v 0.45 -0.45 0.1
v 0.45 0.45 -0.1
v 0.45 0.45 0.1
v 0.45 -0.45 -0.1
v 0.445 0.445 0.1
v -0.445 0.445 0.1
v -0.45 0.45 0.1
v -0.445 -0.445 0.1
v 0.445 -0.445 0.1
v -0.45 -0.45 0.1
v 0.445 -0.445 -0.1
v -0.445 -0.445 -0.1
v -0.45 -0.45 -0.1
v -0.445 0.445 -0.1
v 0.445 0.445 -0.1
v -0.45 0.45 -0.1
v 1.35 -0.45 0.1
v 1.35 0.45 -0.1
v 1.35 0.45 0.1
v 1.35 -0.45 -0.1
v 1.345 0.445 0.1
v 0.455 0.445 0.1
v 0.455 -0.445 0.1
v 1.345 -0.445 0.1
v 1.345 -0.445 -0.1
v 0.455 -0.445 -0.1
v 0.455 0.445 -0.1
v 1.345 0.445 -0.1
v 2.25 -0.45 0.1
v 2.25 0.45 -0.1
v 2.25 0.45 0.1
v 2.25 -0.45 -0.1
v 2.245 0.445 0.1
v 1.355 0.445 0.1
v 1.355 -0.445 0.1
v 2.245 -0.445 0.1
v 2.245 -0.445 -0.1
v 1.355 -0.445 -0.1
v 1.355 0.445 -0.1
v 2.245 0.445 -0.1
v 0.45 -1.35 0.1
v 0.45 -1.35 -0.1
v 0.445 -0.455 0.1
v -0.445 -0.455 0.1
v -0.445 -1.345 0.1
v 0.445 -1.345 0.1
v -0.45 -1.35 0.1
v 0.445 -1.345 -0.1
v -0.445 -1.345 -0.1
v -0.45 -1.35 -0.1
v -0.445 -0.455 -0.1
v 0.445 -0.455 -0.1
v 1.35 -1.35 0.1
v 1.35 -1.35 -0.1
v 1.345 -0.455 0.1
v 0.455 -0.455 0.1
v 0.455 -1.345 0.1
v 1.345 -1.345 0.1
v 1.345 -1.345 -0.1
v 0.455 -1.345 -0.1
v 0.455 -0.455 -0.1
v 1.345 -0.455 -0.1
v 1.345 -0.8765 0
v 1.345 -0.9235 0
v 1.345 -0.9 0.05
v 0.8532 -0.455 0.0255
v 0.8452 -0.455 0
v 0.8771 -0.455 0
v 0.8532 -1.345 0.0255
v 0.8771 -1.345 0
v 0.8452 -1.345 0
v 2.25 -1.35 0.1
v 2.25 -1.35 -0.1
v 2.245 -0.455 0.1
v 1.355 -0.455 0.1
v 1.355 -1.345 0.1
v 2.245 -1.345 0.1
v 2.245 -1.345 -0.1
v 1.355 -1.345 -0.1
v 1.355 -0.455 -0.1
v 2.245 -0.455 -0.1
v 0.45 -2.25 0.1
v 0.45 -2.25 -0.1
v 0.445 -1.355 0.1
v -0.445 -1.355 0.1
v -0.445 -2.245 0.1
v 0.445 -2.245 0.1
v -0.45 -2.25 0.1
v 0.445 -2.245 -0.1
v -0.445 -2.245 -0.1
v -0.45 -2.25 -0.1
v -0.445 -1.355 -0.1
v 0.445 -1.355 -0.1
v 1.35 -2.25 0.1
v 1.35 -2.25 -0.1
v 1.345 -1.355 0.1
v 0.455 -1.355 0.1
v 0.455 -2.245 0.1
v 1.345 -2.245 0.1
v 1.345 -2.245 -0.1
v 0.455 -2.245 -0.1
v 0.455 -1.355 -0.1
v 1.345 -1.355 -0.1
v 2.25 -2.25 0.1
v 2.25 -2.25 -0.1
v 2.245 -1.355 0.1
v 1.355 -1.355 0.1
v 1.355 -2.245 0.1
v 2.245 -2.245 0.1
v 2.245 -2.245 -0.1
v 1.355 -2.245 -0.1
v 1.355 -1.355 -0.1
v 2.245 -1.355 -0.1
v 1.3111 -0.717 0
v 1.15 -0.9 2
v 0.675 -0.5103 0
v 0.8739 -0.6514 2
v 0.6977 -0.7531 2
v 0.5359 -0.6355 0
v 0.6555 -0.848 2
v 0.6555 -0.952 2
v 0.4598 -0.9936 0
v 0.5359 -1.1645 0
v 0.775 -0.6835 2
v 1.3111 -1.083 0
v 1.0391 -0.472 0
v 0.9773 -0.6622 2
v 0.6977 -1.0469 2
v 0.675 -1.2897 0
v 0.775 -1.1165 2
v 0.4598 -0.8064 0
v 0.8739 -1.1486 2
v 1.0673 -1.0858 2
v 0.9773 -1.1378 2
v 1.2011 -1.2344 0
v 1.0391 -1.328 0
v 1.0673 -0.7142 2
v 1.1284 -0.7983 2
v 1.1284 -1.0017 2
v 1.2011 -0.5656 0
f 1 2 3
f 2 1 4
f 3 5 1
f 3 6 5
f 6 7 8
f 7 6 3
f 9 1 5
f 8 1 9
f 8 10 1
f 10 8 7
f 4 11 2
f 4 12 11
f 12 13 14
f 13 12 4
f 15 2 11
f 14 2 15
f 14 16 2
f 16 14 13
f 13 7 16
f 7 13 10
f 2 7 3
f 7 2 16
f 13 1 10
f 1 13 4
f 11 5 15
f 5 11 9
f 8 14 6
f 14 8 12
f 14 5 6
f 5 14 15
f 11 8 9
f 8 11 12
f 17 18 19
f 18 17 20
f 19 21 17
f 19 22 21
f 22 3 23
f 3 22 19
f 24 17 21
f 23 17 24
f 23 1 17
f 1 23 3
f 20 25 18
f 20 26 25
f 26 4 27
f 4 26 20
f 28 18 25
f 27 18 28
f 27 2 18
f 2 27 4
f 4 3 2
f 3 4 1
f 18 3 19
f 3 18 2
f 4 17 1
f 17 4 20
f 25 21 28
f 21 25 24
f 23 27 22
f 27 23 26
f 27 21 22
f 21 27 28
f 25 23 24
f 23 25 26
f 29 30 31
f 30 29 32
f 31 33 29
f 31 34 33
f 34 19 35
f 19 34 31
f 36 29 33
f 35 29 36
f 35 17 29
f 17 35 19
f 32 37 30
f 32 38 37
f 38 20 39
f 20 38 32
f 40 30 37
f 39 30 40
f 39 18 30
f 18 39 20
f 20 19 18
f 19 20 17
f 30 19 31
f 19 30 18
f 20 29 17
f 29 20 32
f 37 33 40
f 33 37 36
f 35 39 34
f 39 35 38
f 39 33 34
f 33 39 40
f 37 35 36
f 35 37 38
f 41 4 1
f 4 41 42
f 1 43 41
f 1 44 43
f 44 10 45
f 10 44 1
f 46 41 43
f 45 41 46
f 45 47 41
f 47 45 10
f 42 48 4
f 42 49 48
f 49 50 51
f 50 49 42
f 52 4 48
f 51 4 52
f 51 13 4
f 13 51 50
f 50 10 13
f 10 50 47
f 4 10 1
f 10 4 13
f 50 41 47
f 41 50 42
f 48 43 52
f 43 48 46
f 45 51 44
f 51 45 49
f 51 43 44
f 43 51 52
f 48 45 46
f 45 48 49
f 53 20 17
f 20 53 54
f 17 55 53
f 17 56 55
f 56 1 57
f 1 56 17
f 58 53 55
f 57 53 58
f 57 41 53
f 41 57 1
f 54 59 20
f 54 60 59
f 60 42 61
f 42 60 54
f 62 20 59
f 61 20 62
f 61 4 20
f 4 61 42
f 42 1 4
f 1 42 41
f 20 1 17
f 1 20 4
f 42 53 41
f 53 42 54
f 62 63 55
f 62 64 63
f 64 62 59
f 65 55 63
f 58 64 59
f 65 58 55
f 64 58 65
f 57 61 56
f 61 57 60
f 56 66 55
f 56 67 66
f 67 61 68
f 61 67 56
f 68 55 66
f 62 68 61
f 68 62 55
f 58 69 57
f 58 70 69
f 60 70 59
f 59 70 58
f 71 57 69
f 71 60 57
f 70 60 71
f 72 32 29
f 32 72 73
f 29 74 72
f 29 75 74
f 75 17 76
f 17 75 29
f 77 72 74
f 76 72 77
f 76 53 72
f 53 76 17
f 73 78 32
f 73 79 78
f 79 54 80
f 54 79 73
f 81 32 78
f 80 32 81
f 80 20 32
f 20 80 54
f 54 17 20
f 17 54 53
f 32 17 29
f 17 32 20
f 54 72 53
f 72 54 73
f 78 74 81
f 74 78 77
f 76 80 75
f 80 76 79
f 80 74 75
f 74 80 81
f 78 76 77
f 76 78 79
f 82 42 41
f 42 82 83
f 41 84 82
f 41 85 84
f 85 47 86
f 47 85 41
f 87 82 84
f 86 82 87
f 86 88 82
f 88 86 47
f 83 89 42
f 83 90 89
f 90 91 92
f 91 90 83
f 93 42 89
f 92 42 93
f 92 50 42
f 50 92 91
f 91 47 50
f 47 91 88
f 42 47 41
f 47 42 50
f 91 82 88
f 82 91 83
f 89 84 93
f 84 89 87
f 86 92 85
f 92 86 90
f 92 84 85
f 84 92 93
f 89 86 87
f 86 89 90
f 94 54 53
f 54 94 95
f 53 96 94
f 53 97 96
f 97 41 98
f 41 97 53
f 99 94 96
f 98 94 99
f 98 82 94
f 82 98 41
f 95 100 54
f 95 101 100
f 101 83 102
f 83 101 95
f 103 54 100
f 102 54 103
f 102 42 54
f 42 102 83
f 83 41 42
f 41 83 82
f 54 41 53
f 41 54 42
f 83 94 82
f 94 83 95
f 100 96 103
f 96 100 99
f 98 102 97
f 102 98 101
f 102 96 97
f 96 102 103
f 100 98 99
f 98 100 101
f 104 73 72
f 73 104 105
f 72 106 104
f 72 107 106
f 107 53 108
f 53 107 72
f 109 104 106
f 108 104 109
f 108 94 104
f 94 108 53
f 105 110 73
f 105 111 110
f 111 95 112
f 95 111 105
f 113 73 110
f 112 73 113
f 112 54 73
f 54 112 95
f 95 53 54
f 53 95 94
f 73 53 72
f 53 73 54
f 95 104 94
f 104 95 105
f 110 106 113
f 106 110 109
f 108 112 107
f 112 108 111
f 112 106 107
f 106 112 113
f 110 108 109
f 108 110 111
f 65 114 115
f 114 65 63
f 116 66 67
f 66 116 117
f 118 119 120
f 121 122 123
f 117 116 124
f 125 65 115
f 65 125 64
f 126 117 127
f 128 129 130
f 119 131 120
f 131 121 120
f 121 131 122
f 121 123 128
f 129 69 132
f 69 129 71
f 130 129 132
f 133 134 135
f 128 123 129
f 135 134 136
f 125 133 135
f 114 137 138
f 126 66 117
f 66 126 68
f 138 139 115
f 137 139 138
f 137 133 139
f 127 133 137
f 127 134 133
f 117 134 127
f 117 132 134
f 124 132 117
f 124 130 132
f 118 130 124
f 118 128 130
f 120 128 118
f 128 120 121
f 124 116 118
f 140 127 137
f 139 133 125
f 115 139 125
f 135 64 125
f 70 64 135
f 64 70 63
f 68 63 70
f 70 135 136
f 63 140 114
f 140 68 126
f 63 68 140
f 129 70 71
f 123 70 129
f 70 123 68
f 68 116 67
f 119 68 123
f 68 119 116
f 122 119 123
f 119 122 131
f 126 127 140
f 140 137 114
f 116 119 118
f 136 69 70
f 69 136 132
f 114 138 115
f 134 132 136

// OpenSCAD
$fn=15;
gridLength = 2.7;
gridSquares = 3;
oneGridLength = gridLength / gridSquares;
module oneGrid(){
  difference(){
    cube([oneGridLength,oneGridLength,0.2], center = true);
    cube([oneGridLength - 0.01,oneGridLength - 0.01,0.3], center = true);

  }
}

module buildGrid(array){
  for ( row=[0:1:gridSquares - 1]) {
    for ( col=[0:1:gridSquares - 1]) {
      translate([col * oneGridLength,row * -1 * oneGridLength,0])
      oneGrid();
    }
  }
  
  for ( row=[0:1:gridSquares - 1]) {
    for ( col=[0:1:gridSquares - 1]) {
      if(array[row][col] == 1){
        translate([col * oneGridLength,row * -1 * oneGridLength,0])
        cylinder(h=2,d1=oneGridLength, d2 = 0.5);
      }   
    }
  }
  
    
}

wire_array = [[0,0,0],
              [0,1,0],
              [0,0,0]];

buildGrid(wire_array);
